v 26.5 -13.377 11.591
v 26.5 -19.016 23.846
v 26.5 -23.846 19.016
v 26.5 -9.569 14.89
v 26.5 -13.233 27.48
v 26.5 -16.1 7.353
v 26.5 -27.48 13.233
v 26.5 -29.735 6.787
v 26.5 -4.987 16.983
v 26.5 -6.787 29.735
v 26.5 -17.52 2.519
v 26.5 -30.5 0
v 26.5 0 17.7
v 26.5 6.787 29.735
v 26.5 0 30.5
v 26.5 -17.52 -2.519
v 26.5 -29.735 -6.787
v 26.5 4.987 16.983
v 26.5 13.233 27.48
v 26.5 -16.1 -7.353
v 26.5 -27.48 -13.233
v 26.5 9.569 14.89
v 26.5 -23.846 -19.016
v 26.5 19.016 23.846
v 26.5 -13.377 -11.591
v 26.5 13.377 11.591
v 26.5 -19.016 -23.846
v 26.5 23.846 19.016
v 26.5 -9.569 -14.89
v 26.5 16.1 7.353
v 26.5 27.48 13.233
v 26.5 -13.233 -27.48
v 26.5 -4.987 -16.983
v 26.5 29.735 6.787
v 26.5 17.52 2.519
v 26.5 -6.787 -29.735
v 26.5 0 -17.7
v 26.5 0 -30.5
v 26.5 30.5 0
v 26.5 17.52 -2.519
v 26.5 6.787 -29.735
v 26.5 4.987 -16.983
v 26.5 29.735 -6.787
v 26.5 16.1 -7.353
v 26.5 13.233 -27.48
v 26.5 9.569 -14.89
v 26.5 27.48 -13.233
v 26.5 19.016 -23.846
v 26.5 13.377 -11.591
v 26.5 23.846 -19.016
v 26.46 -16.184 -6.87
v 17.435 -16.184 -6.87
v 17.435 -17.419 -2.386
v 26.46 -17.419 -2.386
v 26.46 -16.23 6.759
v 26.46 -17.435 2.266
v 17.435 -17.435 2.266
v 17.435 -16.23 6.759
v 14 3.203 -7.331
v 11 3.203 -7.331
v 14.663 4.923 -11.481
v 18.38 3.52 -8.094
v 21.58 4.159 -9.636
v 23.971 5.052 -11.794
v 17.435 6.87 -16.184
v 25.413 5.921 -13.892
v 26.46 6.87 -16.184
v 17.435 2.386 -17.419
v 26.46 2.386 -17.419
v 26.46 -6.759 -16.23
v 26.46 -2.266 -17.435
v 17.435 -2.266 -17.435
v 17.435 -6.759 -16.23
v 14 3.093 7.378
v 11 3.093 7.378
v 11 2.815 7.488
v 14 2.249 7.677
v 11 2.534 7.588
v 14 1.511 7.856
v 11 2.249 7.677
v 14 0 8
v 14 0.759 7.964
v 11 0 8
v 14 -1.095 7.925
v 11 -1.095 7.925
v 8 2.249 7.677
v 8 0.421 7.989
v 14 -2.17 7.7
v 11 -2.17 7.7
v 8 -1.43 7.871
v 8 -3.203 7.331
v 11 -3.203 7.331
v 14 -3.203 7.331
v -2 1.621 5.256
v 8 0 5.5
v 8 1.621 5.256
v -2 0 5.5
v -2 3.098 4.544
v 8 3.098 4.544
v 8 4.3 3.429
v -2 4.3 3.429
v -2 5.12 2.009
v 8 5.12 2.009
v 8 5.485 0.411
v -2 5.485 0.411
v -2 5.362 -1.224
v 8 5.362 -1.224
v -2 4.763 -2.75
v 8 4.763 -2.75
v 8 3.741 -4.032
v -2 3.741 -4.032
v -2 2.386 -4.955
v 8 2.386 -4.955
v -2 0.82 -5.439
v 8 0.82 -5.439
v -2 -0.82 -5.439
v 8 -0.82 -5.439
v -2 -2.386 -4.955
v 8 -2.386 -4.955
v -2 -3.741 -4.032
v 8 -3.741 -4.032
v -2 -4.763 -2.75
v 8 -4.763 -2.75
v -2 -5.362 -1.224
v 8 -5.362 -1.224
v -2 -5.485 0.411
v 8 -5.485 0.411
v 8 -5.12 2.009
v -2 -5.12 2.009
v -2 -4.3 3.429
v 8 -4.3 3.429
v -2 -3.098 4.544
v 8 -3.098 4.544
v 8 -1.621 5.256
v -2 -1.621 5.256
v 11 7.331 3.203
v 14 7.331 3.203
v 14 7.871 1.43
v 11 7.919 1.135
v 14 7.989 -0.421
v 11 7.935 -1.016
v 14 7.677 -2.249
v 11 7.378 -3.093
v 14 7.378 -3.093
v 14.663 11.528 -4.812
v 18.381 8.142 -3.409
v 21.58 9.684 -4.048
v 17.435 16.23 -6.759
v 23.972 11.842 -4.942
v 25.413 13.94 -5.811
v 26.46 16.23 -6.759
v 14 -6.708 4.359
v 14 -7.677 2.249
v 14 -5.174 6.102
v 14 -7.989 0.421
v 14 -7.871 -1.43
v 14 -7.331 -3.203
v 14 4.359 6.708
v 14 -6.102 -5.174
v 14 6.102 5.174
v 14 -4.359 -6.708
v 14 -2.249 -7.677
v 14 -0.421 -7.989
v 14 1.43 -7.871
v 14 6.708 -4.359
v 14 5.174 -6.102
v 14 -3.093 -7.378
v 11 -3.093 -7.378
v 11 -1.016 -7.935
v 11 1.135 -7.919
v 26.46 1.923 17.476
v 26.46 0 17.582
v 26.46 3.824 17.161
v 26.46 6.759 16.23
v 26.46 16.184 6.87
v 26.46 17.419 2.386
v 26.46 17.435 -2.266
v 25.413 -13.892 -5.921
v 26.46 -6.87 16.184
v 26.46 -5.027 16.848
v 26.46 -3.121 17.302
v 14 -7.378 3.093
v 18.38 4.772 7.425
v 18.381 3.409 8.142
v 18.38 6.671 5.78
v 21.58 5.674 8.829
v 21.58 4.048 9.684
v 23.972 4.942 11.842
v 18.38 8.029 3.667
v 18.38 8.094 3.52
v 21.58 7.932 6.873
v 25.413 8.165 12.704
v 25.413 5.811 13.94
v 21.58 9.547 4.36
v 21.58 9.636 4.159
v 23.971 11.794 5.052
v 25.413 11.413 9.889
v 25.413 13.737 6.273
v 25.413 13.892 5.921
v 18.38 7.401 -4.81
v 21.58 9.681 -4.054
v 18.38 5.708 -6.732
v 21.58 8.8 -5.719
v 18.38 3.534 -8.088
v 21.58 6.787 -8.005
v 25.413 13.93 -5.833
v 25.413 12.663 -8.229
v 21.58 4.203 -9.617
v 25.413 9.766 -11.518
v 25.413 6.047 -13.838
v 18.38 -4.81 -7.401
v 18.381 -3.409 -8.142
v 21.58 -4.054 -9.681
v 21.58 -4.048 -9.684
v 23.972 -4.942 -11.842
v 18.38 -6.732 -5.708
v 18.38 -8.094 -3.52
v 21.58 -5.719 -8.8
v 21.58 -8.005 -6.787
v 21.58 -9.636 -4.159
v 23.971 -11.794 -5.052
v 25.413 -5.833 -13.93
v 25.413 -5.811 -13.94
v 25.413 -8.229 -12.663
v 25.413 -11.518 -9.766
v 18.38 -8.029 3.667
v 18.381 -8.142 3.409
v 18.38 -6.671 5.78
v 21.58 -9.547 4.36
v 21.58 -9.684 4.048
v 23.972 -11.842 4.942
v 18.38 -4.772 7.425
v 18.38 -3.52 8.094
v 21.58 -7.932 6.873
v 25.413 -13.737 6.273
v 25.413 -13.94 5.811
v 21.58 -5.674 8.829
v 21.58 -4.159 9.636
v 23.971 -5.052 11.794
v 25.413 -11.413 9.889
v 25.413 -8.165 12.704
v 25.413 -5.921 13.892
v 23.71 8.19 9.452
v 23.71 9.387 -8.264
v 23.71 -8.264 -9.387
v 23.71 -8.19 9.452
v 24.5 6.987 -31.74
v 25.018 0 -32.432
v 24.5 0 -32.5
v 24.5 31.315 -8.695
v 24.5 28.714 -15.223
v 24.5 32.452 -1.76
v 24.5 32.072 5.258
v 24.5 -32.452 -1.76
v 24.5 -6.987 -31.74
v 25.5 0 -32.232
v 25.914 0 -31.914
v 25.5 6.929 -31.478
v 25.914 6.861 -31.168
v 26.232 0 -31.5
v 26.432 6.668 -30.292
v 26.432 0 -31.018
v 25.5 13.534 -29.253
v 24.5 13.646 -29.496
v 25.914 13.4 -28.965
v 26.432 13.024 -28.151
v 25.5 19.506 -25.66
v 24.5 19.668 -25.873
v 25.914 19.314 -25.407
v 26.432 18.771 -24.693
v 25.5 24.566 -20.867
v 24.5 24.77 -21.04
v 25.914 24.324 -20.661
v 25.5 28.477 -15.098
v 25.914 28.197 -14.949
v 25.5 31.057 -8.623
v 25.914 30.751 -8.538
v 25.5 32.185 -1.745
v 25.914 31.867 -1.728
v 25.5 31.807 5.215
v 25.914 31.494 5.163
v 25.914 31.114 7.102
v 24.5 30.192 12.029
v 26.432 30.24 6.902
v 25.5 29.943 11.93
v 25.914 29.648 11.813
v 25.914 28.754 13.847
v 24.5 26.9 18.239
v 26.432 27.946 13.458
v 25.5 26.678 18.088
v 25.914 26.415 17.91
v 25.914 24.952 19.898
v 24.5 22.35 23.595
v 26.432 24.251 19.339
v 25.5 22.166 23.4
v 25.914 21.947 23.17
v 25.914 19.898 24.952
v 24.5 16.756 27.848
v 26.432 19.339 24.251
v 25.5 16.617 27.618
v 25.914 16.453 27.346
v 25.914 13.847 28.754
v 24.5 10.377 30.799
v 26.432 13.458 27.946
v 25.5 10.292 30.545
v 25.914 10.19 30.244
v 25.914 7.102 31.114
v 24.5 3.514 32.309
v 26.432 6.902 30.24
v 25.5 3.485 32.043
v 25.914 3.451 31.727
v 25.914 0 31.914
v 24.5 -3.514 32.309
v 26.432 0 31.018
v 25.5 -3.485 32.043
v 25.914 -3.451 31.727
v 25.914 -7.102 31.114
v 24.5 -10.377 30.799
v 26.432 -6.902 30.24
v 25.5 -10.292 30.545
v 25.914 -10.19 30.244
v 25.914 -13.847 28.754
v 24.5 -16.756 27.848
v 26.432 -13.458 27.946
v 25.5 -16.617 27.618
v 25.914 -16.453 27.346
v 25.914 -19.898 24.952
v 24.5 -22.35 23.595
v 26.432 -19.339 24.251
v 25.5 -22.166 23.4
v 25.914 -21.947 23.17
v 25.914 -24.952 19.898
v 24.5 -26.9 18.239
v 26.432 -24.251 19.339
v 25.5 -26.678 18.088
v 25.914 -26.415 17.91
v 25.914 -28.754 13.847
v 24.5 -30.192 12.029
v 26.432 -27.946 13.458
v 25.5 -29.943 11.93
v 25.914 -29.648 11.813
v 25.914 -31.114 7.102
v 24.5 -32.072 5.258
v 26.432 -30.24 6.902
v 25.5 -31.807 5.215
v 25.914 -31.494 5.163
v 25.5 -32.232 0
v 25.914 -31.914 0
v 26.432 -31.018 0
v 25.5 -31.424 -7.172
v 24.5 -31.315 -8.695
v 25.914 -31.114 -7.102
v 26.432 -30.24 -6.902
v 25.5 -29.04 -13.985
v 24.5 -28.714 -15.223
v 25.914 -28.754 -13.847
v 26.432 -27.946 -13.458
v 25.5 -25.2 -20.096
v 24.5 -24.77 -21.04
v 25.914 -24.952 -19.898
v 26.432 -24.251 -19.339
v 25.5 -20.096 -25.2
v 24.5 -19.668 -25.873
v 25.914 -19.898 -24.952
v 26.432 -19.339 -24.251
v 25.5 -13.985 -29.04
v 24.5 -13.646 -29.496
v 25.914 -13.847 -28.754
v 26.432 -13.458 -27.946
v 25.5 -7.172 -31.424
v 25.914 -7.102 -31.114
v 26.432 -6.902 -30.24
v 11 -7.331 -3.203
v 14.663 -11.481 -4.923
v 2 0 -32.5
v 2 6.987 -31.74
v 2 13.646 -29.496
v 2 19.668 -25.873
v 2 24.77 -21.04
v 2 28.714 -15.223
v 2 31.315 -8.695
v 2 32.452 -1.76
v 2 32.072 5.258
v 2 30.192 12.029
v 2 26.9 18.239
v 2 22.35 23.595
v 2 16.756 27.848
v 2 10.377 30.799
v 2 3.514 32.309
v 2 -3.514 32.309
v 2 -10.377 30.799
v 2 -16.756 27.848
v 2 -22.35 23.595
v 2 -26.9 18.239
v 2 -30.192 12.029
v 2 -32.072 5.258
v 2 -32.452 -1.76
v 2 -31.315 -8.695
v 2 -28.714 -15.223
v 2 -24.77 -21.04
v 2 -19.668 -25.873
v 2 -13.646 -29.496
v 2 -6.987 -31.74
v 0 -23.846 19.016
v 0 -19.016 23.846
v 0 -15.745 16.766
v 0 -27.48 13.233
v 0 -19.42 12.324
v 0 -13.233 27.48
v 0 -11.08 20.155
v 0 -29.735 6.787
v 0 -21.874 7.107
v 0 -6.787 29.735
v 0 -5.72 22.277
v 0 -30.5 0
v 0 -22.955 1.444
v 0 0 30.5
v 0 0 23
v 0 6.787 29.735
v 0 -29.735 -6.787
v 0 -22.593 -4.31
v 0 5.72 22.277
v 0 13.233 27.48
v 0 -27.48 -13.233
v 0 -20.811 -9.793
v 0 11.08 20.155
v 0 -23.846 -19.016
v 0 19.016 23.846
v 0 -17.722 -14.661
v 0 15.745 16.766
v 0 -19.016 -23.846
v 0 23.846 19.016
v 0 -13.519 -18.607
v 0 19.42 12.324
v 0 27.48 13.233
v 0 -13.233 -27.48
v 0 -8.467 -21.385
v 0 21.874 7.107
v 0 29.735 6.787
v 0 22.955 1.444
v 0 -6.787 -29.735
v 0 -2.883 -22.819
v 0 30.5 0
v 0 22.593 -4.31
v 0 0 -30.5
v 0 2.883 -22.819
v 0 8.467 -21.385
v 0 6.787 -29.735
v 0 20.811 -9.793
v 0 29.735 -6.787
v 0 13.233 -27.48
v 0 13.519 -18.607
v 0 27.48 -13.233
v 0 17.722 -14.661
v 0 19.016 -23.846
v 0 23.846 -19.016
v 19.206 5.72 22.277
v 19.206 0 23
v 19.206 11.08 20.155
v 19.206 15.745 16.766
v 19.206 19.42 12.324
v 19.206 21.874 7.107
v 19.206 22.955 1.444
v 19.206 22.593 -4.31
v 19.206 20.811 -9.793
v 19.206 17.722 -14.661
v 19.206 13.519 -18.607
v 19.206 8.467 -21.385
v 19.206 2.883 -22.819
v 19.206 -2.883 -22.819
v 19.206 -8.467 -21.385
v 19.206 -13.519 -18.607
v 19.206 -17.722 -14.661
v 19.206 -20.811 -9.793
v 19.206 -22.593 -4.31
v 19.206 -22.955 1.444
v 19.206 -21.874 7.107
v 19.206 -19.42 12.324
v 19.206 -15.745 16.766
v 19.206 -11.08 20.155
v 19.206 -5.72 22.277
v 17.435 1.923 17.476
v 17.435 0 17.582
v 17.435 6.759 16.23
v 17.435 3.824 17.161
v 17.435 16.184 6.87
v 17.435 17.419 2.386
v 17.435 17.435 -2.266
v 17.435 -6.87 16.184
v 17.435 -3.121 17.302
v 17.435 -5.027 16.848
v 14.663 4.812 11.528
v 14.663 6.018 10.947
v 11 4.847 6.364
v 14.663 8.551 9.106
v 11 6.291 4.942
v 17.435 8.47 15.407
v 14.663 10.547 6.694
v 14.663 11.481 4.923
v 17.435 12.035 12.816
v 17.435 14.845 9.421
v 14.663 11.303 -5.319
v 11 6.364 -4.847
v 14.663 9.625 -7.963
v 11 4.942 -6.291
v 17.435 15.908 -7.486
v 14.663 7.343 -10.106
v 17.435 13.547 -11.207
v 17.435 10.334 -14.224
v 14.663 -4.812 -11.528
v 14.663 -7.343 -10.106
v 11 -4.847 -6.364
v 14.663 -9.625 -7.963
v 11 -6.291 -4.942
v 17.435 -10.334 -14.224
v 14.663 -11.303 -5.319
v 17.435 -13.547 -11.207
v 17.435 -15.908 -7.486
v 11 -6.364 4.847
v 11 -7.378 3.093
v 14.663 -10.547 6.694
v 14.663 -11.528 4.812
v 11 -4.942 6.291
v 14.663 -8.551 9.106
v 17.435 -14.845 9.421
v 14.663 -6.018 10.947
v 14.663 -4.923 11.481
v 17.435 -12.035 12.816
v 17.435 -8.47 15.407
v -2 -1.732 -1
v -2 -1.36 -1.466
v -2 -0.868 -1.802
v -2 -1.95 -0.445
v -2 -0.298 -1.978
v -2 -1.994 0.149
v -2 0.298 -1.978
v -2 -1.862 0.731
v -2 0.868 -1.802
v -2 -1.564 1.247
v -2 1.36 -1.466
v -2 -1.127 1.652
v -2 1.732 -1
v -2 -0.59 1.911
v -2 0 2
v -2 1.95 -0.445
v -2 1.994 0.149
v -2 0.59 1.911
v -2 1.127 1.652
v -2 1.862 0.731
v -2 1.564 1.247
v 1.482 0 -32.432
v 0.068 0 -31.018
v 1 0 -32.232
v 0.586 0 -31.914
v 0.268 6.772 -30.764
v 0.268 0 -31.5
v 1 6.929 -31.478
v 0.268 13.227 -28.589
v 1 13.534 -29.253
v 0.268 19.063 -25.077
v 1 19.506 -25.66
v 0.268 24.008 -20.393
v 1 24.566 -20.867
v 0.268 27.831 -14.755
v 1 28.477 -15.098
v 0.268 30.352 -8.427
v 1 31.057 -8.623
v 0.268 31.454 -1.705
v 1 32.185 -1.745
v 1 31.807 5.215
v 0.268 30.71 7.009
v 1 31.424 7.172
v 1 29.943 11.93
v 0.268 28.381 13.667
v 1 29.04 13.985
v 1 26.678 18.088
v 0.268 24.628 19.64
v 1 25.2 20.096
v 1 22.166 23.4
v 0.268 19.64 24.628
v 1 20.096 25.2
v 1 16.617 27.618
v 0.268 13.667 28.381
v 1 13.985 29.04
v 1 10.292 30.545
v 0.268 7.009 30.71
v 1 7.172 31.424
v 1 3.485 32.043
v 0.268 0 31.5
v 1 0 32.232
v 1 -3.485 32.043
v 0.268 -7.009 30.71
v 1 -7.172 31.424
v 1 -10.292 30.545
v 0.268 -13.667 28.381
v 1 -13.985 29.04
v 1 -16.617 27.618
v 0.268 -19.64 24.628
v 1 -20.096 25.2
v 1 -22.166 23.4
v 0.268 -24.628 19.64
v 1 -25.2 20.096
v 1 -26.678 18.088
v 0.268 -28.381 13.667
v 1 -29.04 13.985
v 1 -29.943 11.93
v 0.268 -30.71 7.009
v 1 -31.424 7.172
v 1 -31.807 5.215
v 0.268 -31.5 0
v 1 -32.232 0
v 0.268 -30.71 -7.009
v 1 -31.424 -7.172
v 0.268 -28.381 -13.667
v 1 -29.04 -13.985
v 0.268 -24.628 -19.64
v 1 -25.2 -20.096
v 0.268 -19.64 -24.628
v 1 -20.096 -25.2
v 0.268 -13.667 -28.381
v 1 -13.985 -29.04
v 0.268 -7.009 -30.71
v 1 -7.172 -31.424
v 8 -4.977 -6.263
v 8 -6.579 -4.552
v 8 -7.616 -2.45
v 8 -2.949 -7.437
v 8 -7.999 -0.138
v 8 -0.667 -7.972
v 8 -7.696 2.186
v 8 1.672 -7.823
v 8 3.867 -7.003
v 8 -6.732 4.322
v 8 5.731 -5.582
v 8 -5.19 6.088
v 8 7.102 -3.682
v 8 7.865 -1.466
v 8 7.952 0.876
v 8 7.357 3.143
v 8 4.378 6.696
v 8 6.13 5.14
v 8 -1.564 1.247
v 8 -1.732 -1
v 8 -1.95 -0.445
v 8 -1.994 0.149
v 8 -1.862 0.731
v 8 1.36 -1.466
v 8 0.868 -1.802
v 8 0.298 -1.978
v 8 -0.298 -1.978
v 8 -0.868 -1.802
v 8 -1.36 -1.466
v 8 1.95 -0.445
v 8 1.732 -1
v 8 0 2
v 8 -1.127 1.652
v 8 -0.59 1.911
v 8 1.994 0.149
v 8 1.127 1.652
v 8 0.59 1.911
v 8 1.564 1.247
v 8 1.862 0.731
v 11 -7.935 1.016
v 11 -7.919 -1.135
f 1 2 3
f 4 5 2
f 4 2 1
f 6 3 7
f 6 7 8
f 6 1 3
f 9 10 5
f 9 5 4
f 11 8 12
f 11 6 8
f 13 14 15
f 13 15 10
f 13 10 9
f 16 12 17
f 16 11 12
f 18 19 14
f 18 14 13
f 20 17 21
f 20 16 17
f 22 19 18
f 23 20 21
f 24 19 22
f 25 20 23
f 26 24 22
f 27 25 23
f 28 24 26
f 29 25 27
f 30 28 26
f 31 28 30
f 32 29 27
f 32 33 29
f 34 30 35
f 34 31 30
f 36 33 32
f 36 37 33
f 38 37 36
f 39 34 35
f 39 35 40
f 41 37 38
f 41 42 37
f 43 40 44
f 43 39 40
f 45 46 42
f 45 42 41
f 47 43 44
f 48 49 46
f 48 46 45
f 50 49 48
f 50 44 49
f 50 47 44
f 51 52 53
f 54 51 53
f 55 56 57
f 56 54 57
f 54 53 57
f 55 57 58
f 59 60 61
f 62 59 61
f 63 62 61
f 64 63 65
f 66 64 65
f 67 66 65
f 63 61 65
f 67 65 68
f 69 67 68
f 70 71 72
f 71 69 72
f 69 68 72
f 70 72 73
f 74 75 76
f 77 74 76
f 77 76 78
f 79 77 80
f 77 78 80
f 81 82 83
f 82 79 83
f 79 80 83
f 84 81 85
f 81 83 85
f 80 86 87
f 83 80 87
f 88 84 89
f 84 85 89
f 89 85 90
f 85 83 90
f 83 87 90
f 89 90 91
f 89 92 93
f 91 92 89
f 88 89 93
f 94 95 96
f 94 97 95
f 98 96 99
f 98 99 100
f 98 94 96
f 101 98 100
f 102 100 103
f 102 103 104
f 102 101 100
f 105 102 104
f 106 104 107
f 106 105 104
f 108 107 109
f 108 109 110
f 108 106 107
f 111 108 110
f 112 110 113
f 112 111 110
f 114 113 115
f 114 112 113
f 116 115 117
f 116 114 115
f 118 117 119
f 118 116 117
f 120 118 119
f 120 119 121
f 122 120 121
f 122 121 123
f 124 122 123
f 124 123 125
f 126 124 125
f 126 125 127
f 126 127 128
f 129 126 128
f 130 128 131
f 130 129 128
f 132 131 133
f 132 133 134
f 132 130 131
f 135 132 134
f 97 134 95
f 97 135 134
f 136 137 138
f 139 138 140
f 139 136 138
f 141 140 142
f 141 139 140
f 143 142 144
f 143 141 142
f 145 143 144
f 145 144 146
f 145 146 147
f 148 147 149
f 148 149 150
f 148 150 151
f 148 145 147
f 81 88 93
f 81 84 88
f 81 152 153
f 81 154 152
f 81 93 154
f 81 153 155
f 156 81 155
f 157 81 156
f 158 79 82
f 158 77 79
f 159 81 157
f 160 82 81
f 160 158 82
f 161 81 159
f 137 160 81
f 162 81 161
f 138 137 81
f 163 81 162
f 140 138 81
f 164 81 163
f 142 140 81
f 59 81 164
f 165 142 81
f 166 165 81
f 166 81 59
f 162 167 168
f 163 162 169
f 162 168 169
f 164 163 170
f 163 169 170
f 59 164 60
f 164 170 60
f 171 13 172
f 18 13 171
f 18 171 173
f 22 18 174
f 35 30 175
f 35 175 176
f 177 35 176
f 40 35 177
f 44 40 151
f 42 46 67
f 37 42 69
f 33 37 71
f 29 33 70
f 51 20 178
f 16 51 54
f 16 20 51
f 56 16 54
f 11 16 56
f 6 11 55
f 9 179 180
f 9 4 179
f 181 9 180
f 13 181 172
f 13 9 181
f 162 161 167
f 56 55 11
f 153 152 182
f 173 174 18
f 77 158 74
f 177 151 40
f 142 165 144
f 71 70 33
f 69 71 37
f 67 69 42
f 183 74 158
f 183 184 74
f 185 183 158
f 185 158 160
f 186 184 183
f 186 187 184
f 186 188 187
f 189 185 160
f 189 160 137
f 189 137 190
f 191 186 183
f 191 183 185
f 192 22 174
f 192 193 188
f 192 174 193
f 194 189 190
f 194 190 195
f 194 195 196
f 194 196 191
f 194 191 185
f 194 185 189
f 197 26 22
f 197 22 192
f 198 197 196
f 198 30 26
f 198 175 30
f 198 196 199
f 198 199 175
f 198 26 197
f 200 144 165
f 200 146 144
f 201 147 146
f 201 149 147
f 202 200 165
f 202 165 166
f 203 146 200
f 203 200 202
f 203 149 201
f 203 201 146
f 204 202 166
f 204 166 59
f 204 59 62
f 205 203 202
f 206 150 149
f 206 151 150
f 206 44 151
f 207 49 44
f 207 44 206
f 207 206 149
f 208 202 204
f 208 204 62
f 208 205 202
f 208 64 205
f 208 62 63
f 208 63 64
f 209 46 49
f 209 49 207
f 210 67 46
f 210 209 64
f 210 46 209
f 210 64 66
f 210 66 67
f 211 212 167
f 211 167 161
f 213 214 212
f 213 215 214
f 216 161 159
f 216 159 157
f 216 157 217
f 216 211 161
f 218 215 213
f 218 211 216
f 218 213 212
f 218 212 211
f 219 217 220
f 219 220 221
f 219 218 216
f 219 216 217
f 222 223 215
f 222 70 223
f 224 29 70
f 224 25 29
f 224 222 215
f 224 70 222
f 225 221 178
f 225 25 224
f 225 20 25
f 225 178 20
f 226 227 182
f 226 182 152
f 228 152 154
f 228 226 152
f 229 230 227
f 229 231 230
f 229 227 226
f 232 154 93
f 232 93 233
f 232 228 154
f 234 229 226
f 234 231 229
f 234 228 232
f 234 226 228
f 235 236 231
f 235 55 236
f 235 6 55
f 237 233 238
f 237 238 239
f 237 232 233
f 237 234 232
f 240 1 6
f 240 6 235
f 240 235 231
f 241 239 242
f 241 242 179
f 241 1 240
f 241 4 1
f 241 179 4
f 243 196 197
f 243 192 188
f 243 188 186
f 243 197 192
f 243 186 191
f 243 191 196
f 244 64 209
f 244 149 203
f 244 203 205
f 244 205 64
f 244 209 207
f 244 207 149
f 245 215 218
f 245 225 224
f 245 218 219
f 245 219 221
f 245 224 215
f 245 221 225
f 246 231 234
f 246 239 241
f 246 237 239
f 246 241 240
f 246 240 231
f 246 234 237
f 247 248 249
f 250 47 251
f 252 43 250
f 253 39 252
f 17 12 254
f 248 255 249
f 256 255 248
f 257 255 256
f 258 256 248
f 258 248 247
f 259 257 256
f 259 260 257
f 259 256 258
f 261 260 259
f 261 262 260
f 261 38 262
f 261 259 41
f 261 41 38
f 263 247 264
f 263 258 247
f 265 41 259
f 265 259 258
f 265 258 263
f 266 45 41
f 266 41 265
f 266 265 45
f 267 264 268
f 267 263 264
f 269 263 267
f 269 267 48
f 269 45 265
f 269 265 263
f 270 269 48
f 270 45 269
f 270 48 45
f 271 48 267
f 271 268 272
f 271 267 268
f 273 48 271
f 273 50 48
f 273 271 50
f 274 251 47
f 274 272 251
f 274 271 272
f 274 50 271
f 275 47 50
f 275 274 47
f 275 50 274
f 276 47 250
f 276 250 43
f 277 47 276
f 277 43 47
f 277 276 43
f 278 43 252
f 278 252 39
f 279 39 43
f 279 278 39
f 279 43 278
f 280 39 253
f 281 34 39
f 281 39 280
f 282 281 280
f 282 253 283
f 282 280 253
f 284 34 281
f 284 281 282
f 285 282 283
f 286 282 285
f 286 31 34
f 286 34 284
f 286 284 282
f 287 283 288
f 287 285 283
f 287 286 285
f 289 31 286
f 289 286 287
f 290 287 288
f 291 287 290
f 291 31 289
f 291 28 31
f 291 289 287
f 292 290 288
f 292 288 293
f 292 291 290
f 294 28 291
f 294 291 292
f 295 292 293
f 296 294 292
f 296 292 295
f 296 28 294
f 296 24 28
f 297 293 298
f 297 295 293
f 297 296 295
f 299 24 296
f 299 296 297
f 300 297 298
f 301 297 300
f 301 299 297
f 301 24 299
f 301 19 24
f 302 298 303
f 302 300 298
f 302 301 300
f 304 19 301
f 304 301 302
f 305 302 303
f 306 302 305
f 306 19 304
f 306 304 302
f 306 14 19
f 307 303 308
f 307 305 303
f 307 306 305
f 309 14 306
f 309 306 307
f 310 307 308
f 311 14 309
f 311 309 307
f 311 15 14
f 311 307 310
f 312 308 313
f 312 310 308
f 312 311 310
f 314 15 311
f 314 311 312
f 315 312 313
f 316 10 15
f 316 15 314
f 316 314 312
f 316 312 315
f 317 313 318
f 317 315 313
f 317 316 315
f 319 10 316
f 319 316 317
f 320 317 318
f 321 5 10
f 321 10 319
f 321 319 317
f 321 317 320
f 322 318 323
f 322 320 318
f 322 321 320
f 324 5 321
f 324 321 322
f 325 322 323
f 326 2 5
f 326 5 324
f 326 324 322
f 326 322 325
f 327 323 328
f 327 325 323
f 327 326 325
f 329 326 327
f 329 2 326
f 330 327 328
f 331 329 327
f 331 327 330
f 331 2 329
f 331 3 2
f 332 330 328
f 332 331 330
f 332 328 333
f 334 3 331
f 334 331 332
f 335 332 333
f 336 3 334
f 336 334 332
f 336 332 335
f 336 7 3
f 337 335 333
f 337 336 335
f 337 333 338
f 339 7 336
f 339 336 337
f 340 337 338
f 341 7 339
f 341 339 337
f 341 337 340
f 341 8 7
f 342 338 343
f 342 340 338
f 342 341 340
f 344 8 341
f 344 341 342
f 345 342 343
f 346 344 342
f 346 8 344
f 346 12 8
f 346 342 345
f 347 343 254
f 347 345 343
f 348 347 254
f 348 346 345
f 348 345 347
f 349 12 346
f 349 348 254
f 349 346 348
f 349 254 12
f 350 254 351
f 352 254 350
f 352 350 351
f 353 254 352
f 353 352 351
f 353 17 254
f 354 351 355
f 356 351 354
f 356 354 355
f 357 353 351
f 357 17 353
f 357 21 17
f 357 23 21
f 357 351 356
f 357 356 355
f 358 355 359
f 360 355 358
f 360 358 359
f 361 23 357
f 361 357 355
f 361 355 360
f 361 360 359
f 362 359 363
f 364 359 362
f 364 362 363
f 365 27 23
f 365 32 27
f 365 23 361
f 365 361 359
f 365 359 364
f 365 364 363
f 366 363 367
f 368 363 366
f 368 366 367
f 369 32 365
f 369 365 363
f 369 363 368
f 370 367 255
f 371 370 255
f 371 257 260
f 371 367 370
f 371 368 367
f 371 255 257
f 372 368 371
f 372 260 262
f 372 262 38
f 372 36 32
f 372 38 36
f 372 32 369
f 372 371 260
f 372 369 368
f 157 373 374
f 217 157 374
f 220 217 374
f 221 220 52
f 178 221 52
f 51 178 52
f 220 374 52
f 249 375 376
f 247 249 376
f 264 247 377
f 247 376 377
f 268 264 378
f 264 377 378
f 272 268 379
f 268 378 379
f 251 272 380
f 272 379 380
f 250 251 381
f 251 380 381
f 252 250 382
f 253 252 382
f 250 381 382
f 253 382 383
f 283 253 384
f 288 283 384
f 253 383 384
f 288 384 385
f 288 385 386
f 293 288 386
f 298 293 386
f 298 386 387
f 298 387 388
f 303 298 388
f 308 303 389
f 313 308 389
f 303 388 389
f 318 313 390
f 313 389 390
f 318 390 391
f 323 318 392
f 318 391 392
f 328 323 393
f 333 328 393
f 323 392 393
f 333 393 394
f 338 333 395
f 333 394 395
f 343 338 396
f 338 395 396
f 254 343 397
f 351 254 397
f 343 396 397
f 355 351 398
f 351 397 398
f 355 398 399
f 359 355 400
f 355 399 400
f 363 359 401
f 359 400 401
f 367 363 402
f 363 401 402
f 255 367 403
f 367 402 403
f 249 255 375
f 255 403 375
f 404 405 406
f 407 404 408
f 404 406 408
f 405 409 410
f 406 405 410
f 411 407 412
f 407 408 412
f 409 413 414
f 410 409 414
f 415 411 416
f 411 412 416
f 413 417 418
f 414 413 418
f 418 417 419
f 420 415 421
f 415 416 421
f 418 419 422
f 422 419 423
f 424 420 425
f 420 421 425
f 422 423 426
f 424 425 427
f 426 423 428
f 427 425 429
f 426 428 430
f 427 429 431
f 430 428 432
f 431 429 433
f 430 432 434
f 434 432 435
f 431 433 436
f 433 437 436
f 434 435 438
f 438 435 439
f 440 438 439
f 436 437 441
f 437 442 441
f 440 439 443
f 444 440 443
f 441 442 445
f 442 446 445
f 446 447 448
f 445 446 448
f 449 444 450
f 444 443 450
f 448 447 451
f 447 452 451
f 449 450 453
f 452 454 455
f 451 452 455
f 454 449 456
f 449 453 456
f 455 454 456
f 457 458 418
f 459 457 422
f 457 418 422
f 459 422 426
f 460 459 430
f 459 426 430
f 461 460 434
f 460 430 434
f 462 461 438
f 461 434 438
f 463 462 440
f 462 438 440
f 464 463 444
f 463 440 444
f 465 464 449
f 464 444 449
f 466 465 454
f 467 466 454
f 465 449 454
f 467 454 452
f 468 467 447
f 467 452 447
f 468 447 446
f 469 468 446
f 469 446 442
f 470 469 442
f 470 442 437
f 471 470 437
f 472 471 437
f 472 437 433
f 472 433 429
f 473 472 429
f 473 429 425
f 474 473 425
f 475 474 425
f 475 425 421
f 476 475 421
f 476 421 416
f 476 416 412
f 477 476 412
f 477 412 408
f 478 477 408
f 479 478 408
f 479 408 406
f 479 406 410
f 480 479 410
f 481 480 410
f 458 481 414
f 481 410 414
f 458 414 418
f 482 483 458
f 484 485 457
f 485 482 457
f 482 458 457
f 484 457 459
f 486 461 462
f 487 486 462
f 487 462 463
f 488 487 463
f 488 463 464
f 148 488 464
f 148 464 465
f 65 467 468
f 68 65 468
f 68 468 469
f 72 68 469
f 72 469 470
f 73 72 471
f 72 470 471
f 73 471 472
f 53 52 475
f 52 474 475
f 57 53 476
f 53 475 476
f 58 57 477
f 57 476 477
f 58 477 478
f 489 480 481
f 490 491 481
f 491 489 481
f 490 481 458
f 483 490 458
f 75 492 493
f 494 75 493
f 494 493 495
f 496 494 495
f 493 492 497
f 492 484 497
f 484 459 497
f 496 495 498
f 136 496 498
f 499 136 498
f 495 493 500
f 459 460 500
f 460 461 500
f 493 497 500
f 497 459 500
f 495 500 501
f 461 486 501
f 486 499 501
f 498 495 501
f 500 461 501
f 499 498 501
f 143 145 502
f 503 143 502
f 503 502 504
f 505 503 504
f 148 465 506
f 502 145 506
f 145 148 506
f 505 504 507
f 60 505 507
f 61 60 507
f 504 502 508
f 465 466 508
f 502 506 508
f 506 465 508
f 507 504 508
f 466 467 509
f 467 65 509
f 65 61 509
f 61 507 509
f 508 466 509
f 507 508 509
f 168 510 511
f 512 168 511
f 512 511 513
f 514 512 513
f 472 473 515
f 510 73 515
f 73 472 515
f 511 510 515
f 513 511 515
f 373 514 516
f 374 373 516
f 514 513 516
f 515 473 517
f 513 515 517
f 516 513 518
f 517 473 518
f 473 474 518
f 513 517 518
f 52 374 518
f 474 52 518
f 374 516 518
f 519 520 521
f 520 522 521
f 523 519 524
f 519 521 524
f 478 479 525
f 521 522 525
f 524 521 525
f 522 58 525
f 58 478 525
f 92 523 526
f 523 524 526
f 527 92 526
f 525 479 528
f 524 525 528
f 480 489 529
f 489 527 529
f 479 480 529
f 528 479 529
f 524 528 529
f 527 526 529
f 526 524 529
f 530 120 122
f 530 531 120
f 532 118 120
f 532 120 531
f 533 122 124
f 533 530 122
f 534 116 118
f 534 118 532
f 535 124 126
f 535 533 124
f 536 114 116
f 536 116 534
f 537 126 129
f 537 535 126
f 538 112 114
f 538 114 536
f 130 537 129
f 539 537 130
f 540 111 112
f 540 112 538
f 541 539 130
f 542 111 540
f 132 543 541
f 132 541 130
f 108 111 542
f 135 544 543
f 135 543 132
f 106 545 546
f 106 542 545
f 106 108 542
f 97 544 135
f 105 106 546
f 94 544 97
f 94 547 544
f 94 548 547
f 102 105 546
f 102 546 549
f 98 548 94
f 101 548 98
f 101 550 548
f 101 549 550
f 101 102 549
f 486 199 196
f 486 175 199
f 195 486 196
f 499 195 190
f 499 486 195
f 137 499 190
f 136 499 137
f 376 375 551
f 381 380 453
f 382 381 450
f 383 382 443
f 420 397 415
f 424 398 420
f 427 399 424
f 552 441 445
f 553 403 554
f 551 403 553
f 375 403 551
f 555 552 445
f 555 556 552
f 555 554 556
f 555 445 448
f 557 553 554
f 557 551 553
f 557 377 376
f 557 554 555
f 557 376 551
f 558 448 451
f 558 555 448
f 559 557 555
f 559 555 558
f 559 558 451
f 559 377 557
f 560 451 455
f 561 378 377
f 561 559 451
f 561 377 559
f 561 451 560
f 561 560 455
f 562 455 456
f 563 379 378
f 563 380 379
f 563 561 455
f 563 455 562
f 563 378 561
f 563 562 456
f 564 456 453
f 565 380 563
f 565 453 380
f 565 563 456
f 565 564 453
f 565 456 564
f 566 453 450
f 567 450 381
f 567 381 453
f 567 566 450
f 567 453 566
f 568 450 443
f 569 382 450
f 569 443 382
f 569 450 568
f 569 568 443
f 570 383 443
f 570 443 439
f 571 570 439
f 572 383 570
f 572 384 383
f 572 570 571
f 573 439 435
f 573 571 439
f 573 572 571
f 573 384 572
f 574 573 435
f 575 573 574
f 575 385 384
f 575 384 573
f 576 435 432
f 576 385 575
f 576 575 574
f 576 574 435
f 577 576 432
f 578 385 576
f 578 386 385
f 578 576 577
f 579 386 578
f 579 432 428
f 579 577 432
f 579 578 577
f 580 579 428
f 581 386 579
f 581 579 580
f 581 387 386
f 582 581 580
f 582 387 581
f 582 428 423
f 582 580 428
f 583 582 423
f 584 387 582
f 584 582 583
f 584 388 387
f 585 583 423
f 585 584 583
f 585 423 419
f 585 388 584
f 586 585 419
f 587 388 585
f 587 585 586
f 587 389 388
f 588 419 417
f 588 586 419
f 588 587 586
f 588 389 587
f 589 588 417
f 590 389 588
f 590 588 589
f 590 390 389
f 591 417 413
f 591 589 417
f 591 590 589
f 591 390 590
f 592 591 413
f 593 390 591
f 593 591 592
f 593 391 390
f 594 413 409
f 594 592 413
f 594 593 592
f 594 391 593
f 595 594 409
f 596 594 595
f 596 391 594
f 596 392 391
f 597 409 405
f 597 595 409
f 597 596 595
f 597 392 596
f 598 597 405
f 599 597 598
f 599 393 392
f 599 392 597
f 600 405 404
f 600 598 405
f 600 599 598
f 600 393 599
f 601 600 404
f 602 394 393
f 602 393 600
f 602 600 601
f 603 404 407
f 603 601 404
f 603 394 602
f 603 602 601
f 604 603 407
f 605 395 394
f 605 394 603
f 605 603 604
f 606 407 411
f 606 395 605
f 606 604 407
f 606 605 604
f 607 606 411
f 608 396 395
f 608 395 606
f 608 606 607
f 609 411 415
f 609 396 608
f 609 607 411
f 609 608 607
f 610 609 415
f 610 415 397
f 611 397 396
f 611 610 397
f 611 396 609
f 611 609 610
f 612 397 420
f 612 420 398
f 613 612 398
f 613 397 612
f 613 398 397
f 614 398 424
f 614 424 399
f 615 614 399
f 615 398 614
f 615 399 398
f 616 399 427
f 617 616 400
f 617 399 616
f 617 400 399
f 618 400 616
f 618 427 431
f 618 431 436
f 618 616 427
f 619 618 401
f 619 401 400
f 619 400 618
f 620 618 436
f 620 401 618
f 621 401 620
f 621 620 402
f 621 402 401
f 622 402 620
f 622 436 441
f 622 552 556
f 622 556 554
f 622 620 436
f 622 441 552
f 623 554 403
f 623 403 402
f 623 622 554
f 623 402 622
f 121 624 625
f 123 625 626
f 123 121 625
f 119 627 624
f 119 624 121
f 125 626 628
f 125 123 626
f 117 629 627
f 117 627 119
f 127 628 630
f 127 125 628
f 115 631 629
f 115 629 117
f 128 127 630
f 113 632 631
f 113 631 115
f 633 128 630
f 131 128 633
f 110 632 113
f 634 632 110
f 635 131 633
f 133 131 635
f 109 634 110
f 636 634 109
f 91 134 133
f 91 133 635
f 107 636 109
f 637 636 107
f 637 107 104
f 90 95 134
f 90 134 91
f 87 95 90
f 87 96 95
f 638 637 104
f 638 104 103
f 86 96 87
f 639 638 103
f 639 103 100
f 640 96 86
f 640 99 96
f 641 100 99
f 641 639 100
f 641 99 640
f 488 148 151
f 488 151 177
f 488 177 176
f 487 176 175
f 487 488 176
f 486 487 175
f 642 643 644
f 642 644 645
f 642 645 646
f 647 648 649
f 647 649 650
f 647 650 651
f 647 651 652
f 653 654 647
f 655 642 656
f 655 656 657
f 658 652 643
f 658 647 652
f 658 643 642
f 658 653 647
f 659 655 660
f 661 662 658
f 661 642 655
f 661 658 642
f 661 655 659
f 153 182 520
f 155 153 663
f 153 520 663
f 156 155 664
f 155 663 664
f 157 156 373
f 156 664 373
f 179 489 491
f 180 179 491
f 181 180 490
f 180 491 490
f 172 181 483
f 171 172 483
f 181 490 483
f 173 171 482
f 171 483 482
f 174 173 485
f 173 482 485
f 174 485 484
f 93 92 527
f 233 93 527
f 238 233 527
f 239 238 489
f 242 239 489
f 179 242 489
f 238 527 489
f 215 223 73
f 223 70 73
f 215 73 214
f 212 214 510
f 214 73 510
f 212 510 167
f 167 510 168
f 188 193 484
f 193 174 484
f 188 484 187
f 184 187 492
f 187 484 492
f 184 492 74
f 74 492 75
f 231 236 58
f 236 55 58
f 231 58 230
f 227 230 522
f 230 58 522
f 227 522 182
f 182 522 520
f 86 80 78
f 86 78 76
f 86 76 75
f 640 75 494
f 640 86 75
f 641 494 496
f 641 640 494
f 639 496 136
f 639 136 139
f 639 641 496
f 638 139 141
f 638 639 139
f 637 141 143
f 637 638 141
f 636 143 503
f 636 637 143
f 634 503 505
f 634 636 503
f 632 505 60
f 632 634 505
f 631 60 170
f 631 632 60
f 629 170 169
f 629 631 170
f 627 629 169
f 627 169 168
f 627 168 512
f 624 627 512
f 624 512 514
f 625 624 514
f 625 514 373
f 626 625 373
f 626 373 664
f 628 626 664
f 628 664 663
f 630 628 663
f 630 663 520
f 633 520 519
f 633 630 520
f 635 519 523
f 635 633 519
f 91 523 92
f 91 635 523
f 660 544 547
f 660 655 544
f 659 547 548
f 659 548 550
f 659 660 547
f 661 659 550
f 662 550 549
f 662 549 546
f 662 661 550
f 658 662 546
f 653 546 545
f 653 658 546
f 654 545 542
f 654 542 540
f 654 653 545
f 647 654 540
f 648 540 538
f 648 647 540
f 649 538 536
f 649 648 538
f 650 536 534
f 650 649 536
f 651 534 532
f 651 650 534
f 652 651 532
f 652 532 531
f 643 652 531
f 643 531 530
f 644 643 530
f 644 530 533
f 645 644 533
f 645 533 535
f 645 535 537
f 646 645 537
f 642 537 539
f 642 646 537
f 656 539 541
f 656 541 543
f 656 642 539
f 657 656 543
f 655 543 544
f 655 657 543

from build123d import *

# Parameters (mm, degrees)
SKETCH_1_R          = 32.5
EXTRUDE_1_DEPTH     = 26.5
SKETCH_2_R          = 23
CUT_EXTRUDE_1_DEPTH = 26.5
CUT_EXTRUDE_START   = -26.5
CUT_EXTRUDE_2_DEPTH = 26.5
FILLET_1_R          = 2


with BuildPart() as part:
    # 草图1 → 凸台-拉伸1 (new body)
    with BuildSketch(Plane(origin=(0, 0, 0), x_dir=(0, 0, -1), z_dir=(1, 0, 0))):
        Circle(SKETCH_1_R)
    extrude(amount=EXTRUDE_1_DEPTH)

    # 草图2 → 切除-拉伸1 (cut)
    with BuildSketch(Plane.ZY):
        Circle(SKETCH_2_R)
    extrude(amount=-CUT_EXTRUDE_1_DEPTH, mode=Mode.SUBTRACT)

    # 草图3 → 旋转2 (revolve)
    with BuildSketch(Plane.XY, mode=Mode.PRIVATE) as revolve_2_sk:
        Polygon((8, 2), (8, 0), (14, 0), (14, 8), (11, 8), (8, 8), (8, 5.5), (-2, 5.5), (-2, 2), align=None)
        with BuildLine():
            Line((11, 8), (14, 8))
            add(Edge.make_bspline(
                [(14, 8), (23.420598, 8.526198), (26.5, 17.699792)],
                knots=[0, 0, 0, 1, 1, 1], degree=2))
            Line((26.5, 17.699792), (26.5, 23))
            Line((26.5, 23), (19.206037, 23))
            add(Edge.make_bspline(
                [(11, 8), (17.176221, 14.336446), (19.206037, 23)],
                knots=[0, 0, 0, 1, 1, 1], degree=2))
        make_face()
    revolve(revolve_2_sk.sketch.rotate(Axis((26.5, 0, 0), (-1, 0, 0)), 270), axis=Axis((26.5, 0, 0), (-1, 0, 0)))

    # 草图4 → 切除-拉伸2 (cut)
    with BuildSketch(Plane(origin=(26.5, 0, 0), x_dir=(0, 0, -1), z_dir=(1, 0, 0)).offset(CUT_EXTRUDE_START)):
        with BuildLine():
            Line((16.230217, -6.759498), (7.377987, -3.092784))
            ThreePointArc((7.377987, -3.092784), (7.999773, 0.060211), (7.330597, 3.20349))
            Line((7.330597, 3.20349), (16.183541, 6.870499))
            ThreePointArc((16.183541, 6.870499), (17.581443, 0.060208), (16.230217, -6.759498))
        make_face()
        with BuildLine():
            Line((-6.759498, -16.230217), (-3.092784, -7.377987))
            ThreePointArc((-3.092784, -7.377987), (0.060211, -7.999773), (3.20349, -7.330597))
            Line((3.20349, -7.330597), (6.870499, -16.183541))
            ThreePointArc((6.870499, -16.183541), (0.060208, -17.581443), (-6.759498, -16.230217))
        make_face()
        with BuildLine():
            Line((-6.870499, 16.183541), (-3.20349, 7.330597))
            ThreePointArc((-3.20349, 7.330597), (-0.060211, 7.999773), (3.092784, 7.377987))
            Line((3.092784, 7.377987), (6.759498, 16.230217))
            ThreePointArc((6.759498, 16.230217), (-0.060208, 17.581443), (-6.870499, 16.183541))
        make_face()
        with BuildLine():
            Line((-16.230217, 6.759498), (-7.377987, 3.092784))
            ThreePointArc((-7.377987, 3.092784), (-7.999773, -0.060211), (-7.330597, -3.20349))
            Line((-7.330597, -3.20349), (-16.183541, -6.870499))
            ThreePointArc((-16.183541, -6.870499), (-17.581443, -0.060208), (-16.230217, 6.759498))
        make_face()
    extrude(amount=CUT_EXTRUDE_2_DEPTH, mode=Mode.SUBTRACT)

    # 圆角1
    fillet_1_edges = [part.edges().sort_by_distance(p)[0] for p in [
        (0, 0, 32.5),
        (26.5, 0, 32.5),
    ]]
    fillet(fillet_1_edges, radius=FILLET_1_R)


solid = part.part
